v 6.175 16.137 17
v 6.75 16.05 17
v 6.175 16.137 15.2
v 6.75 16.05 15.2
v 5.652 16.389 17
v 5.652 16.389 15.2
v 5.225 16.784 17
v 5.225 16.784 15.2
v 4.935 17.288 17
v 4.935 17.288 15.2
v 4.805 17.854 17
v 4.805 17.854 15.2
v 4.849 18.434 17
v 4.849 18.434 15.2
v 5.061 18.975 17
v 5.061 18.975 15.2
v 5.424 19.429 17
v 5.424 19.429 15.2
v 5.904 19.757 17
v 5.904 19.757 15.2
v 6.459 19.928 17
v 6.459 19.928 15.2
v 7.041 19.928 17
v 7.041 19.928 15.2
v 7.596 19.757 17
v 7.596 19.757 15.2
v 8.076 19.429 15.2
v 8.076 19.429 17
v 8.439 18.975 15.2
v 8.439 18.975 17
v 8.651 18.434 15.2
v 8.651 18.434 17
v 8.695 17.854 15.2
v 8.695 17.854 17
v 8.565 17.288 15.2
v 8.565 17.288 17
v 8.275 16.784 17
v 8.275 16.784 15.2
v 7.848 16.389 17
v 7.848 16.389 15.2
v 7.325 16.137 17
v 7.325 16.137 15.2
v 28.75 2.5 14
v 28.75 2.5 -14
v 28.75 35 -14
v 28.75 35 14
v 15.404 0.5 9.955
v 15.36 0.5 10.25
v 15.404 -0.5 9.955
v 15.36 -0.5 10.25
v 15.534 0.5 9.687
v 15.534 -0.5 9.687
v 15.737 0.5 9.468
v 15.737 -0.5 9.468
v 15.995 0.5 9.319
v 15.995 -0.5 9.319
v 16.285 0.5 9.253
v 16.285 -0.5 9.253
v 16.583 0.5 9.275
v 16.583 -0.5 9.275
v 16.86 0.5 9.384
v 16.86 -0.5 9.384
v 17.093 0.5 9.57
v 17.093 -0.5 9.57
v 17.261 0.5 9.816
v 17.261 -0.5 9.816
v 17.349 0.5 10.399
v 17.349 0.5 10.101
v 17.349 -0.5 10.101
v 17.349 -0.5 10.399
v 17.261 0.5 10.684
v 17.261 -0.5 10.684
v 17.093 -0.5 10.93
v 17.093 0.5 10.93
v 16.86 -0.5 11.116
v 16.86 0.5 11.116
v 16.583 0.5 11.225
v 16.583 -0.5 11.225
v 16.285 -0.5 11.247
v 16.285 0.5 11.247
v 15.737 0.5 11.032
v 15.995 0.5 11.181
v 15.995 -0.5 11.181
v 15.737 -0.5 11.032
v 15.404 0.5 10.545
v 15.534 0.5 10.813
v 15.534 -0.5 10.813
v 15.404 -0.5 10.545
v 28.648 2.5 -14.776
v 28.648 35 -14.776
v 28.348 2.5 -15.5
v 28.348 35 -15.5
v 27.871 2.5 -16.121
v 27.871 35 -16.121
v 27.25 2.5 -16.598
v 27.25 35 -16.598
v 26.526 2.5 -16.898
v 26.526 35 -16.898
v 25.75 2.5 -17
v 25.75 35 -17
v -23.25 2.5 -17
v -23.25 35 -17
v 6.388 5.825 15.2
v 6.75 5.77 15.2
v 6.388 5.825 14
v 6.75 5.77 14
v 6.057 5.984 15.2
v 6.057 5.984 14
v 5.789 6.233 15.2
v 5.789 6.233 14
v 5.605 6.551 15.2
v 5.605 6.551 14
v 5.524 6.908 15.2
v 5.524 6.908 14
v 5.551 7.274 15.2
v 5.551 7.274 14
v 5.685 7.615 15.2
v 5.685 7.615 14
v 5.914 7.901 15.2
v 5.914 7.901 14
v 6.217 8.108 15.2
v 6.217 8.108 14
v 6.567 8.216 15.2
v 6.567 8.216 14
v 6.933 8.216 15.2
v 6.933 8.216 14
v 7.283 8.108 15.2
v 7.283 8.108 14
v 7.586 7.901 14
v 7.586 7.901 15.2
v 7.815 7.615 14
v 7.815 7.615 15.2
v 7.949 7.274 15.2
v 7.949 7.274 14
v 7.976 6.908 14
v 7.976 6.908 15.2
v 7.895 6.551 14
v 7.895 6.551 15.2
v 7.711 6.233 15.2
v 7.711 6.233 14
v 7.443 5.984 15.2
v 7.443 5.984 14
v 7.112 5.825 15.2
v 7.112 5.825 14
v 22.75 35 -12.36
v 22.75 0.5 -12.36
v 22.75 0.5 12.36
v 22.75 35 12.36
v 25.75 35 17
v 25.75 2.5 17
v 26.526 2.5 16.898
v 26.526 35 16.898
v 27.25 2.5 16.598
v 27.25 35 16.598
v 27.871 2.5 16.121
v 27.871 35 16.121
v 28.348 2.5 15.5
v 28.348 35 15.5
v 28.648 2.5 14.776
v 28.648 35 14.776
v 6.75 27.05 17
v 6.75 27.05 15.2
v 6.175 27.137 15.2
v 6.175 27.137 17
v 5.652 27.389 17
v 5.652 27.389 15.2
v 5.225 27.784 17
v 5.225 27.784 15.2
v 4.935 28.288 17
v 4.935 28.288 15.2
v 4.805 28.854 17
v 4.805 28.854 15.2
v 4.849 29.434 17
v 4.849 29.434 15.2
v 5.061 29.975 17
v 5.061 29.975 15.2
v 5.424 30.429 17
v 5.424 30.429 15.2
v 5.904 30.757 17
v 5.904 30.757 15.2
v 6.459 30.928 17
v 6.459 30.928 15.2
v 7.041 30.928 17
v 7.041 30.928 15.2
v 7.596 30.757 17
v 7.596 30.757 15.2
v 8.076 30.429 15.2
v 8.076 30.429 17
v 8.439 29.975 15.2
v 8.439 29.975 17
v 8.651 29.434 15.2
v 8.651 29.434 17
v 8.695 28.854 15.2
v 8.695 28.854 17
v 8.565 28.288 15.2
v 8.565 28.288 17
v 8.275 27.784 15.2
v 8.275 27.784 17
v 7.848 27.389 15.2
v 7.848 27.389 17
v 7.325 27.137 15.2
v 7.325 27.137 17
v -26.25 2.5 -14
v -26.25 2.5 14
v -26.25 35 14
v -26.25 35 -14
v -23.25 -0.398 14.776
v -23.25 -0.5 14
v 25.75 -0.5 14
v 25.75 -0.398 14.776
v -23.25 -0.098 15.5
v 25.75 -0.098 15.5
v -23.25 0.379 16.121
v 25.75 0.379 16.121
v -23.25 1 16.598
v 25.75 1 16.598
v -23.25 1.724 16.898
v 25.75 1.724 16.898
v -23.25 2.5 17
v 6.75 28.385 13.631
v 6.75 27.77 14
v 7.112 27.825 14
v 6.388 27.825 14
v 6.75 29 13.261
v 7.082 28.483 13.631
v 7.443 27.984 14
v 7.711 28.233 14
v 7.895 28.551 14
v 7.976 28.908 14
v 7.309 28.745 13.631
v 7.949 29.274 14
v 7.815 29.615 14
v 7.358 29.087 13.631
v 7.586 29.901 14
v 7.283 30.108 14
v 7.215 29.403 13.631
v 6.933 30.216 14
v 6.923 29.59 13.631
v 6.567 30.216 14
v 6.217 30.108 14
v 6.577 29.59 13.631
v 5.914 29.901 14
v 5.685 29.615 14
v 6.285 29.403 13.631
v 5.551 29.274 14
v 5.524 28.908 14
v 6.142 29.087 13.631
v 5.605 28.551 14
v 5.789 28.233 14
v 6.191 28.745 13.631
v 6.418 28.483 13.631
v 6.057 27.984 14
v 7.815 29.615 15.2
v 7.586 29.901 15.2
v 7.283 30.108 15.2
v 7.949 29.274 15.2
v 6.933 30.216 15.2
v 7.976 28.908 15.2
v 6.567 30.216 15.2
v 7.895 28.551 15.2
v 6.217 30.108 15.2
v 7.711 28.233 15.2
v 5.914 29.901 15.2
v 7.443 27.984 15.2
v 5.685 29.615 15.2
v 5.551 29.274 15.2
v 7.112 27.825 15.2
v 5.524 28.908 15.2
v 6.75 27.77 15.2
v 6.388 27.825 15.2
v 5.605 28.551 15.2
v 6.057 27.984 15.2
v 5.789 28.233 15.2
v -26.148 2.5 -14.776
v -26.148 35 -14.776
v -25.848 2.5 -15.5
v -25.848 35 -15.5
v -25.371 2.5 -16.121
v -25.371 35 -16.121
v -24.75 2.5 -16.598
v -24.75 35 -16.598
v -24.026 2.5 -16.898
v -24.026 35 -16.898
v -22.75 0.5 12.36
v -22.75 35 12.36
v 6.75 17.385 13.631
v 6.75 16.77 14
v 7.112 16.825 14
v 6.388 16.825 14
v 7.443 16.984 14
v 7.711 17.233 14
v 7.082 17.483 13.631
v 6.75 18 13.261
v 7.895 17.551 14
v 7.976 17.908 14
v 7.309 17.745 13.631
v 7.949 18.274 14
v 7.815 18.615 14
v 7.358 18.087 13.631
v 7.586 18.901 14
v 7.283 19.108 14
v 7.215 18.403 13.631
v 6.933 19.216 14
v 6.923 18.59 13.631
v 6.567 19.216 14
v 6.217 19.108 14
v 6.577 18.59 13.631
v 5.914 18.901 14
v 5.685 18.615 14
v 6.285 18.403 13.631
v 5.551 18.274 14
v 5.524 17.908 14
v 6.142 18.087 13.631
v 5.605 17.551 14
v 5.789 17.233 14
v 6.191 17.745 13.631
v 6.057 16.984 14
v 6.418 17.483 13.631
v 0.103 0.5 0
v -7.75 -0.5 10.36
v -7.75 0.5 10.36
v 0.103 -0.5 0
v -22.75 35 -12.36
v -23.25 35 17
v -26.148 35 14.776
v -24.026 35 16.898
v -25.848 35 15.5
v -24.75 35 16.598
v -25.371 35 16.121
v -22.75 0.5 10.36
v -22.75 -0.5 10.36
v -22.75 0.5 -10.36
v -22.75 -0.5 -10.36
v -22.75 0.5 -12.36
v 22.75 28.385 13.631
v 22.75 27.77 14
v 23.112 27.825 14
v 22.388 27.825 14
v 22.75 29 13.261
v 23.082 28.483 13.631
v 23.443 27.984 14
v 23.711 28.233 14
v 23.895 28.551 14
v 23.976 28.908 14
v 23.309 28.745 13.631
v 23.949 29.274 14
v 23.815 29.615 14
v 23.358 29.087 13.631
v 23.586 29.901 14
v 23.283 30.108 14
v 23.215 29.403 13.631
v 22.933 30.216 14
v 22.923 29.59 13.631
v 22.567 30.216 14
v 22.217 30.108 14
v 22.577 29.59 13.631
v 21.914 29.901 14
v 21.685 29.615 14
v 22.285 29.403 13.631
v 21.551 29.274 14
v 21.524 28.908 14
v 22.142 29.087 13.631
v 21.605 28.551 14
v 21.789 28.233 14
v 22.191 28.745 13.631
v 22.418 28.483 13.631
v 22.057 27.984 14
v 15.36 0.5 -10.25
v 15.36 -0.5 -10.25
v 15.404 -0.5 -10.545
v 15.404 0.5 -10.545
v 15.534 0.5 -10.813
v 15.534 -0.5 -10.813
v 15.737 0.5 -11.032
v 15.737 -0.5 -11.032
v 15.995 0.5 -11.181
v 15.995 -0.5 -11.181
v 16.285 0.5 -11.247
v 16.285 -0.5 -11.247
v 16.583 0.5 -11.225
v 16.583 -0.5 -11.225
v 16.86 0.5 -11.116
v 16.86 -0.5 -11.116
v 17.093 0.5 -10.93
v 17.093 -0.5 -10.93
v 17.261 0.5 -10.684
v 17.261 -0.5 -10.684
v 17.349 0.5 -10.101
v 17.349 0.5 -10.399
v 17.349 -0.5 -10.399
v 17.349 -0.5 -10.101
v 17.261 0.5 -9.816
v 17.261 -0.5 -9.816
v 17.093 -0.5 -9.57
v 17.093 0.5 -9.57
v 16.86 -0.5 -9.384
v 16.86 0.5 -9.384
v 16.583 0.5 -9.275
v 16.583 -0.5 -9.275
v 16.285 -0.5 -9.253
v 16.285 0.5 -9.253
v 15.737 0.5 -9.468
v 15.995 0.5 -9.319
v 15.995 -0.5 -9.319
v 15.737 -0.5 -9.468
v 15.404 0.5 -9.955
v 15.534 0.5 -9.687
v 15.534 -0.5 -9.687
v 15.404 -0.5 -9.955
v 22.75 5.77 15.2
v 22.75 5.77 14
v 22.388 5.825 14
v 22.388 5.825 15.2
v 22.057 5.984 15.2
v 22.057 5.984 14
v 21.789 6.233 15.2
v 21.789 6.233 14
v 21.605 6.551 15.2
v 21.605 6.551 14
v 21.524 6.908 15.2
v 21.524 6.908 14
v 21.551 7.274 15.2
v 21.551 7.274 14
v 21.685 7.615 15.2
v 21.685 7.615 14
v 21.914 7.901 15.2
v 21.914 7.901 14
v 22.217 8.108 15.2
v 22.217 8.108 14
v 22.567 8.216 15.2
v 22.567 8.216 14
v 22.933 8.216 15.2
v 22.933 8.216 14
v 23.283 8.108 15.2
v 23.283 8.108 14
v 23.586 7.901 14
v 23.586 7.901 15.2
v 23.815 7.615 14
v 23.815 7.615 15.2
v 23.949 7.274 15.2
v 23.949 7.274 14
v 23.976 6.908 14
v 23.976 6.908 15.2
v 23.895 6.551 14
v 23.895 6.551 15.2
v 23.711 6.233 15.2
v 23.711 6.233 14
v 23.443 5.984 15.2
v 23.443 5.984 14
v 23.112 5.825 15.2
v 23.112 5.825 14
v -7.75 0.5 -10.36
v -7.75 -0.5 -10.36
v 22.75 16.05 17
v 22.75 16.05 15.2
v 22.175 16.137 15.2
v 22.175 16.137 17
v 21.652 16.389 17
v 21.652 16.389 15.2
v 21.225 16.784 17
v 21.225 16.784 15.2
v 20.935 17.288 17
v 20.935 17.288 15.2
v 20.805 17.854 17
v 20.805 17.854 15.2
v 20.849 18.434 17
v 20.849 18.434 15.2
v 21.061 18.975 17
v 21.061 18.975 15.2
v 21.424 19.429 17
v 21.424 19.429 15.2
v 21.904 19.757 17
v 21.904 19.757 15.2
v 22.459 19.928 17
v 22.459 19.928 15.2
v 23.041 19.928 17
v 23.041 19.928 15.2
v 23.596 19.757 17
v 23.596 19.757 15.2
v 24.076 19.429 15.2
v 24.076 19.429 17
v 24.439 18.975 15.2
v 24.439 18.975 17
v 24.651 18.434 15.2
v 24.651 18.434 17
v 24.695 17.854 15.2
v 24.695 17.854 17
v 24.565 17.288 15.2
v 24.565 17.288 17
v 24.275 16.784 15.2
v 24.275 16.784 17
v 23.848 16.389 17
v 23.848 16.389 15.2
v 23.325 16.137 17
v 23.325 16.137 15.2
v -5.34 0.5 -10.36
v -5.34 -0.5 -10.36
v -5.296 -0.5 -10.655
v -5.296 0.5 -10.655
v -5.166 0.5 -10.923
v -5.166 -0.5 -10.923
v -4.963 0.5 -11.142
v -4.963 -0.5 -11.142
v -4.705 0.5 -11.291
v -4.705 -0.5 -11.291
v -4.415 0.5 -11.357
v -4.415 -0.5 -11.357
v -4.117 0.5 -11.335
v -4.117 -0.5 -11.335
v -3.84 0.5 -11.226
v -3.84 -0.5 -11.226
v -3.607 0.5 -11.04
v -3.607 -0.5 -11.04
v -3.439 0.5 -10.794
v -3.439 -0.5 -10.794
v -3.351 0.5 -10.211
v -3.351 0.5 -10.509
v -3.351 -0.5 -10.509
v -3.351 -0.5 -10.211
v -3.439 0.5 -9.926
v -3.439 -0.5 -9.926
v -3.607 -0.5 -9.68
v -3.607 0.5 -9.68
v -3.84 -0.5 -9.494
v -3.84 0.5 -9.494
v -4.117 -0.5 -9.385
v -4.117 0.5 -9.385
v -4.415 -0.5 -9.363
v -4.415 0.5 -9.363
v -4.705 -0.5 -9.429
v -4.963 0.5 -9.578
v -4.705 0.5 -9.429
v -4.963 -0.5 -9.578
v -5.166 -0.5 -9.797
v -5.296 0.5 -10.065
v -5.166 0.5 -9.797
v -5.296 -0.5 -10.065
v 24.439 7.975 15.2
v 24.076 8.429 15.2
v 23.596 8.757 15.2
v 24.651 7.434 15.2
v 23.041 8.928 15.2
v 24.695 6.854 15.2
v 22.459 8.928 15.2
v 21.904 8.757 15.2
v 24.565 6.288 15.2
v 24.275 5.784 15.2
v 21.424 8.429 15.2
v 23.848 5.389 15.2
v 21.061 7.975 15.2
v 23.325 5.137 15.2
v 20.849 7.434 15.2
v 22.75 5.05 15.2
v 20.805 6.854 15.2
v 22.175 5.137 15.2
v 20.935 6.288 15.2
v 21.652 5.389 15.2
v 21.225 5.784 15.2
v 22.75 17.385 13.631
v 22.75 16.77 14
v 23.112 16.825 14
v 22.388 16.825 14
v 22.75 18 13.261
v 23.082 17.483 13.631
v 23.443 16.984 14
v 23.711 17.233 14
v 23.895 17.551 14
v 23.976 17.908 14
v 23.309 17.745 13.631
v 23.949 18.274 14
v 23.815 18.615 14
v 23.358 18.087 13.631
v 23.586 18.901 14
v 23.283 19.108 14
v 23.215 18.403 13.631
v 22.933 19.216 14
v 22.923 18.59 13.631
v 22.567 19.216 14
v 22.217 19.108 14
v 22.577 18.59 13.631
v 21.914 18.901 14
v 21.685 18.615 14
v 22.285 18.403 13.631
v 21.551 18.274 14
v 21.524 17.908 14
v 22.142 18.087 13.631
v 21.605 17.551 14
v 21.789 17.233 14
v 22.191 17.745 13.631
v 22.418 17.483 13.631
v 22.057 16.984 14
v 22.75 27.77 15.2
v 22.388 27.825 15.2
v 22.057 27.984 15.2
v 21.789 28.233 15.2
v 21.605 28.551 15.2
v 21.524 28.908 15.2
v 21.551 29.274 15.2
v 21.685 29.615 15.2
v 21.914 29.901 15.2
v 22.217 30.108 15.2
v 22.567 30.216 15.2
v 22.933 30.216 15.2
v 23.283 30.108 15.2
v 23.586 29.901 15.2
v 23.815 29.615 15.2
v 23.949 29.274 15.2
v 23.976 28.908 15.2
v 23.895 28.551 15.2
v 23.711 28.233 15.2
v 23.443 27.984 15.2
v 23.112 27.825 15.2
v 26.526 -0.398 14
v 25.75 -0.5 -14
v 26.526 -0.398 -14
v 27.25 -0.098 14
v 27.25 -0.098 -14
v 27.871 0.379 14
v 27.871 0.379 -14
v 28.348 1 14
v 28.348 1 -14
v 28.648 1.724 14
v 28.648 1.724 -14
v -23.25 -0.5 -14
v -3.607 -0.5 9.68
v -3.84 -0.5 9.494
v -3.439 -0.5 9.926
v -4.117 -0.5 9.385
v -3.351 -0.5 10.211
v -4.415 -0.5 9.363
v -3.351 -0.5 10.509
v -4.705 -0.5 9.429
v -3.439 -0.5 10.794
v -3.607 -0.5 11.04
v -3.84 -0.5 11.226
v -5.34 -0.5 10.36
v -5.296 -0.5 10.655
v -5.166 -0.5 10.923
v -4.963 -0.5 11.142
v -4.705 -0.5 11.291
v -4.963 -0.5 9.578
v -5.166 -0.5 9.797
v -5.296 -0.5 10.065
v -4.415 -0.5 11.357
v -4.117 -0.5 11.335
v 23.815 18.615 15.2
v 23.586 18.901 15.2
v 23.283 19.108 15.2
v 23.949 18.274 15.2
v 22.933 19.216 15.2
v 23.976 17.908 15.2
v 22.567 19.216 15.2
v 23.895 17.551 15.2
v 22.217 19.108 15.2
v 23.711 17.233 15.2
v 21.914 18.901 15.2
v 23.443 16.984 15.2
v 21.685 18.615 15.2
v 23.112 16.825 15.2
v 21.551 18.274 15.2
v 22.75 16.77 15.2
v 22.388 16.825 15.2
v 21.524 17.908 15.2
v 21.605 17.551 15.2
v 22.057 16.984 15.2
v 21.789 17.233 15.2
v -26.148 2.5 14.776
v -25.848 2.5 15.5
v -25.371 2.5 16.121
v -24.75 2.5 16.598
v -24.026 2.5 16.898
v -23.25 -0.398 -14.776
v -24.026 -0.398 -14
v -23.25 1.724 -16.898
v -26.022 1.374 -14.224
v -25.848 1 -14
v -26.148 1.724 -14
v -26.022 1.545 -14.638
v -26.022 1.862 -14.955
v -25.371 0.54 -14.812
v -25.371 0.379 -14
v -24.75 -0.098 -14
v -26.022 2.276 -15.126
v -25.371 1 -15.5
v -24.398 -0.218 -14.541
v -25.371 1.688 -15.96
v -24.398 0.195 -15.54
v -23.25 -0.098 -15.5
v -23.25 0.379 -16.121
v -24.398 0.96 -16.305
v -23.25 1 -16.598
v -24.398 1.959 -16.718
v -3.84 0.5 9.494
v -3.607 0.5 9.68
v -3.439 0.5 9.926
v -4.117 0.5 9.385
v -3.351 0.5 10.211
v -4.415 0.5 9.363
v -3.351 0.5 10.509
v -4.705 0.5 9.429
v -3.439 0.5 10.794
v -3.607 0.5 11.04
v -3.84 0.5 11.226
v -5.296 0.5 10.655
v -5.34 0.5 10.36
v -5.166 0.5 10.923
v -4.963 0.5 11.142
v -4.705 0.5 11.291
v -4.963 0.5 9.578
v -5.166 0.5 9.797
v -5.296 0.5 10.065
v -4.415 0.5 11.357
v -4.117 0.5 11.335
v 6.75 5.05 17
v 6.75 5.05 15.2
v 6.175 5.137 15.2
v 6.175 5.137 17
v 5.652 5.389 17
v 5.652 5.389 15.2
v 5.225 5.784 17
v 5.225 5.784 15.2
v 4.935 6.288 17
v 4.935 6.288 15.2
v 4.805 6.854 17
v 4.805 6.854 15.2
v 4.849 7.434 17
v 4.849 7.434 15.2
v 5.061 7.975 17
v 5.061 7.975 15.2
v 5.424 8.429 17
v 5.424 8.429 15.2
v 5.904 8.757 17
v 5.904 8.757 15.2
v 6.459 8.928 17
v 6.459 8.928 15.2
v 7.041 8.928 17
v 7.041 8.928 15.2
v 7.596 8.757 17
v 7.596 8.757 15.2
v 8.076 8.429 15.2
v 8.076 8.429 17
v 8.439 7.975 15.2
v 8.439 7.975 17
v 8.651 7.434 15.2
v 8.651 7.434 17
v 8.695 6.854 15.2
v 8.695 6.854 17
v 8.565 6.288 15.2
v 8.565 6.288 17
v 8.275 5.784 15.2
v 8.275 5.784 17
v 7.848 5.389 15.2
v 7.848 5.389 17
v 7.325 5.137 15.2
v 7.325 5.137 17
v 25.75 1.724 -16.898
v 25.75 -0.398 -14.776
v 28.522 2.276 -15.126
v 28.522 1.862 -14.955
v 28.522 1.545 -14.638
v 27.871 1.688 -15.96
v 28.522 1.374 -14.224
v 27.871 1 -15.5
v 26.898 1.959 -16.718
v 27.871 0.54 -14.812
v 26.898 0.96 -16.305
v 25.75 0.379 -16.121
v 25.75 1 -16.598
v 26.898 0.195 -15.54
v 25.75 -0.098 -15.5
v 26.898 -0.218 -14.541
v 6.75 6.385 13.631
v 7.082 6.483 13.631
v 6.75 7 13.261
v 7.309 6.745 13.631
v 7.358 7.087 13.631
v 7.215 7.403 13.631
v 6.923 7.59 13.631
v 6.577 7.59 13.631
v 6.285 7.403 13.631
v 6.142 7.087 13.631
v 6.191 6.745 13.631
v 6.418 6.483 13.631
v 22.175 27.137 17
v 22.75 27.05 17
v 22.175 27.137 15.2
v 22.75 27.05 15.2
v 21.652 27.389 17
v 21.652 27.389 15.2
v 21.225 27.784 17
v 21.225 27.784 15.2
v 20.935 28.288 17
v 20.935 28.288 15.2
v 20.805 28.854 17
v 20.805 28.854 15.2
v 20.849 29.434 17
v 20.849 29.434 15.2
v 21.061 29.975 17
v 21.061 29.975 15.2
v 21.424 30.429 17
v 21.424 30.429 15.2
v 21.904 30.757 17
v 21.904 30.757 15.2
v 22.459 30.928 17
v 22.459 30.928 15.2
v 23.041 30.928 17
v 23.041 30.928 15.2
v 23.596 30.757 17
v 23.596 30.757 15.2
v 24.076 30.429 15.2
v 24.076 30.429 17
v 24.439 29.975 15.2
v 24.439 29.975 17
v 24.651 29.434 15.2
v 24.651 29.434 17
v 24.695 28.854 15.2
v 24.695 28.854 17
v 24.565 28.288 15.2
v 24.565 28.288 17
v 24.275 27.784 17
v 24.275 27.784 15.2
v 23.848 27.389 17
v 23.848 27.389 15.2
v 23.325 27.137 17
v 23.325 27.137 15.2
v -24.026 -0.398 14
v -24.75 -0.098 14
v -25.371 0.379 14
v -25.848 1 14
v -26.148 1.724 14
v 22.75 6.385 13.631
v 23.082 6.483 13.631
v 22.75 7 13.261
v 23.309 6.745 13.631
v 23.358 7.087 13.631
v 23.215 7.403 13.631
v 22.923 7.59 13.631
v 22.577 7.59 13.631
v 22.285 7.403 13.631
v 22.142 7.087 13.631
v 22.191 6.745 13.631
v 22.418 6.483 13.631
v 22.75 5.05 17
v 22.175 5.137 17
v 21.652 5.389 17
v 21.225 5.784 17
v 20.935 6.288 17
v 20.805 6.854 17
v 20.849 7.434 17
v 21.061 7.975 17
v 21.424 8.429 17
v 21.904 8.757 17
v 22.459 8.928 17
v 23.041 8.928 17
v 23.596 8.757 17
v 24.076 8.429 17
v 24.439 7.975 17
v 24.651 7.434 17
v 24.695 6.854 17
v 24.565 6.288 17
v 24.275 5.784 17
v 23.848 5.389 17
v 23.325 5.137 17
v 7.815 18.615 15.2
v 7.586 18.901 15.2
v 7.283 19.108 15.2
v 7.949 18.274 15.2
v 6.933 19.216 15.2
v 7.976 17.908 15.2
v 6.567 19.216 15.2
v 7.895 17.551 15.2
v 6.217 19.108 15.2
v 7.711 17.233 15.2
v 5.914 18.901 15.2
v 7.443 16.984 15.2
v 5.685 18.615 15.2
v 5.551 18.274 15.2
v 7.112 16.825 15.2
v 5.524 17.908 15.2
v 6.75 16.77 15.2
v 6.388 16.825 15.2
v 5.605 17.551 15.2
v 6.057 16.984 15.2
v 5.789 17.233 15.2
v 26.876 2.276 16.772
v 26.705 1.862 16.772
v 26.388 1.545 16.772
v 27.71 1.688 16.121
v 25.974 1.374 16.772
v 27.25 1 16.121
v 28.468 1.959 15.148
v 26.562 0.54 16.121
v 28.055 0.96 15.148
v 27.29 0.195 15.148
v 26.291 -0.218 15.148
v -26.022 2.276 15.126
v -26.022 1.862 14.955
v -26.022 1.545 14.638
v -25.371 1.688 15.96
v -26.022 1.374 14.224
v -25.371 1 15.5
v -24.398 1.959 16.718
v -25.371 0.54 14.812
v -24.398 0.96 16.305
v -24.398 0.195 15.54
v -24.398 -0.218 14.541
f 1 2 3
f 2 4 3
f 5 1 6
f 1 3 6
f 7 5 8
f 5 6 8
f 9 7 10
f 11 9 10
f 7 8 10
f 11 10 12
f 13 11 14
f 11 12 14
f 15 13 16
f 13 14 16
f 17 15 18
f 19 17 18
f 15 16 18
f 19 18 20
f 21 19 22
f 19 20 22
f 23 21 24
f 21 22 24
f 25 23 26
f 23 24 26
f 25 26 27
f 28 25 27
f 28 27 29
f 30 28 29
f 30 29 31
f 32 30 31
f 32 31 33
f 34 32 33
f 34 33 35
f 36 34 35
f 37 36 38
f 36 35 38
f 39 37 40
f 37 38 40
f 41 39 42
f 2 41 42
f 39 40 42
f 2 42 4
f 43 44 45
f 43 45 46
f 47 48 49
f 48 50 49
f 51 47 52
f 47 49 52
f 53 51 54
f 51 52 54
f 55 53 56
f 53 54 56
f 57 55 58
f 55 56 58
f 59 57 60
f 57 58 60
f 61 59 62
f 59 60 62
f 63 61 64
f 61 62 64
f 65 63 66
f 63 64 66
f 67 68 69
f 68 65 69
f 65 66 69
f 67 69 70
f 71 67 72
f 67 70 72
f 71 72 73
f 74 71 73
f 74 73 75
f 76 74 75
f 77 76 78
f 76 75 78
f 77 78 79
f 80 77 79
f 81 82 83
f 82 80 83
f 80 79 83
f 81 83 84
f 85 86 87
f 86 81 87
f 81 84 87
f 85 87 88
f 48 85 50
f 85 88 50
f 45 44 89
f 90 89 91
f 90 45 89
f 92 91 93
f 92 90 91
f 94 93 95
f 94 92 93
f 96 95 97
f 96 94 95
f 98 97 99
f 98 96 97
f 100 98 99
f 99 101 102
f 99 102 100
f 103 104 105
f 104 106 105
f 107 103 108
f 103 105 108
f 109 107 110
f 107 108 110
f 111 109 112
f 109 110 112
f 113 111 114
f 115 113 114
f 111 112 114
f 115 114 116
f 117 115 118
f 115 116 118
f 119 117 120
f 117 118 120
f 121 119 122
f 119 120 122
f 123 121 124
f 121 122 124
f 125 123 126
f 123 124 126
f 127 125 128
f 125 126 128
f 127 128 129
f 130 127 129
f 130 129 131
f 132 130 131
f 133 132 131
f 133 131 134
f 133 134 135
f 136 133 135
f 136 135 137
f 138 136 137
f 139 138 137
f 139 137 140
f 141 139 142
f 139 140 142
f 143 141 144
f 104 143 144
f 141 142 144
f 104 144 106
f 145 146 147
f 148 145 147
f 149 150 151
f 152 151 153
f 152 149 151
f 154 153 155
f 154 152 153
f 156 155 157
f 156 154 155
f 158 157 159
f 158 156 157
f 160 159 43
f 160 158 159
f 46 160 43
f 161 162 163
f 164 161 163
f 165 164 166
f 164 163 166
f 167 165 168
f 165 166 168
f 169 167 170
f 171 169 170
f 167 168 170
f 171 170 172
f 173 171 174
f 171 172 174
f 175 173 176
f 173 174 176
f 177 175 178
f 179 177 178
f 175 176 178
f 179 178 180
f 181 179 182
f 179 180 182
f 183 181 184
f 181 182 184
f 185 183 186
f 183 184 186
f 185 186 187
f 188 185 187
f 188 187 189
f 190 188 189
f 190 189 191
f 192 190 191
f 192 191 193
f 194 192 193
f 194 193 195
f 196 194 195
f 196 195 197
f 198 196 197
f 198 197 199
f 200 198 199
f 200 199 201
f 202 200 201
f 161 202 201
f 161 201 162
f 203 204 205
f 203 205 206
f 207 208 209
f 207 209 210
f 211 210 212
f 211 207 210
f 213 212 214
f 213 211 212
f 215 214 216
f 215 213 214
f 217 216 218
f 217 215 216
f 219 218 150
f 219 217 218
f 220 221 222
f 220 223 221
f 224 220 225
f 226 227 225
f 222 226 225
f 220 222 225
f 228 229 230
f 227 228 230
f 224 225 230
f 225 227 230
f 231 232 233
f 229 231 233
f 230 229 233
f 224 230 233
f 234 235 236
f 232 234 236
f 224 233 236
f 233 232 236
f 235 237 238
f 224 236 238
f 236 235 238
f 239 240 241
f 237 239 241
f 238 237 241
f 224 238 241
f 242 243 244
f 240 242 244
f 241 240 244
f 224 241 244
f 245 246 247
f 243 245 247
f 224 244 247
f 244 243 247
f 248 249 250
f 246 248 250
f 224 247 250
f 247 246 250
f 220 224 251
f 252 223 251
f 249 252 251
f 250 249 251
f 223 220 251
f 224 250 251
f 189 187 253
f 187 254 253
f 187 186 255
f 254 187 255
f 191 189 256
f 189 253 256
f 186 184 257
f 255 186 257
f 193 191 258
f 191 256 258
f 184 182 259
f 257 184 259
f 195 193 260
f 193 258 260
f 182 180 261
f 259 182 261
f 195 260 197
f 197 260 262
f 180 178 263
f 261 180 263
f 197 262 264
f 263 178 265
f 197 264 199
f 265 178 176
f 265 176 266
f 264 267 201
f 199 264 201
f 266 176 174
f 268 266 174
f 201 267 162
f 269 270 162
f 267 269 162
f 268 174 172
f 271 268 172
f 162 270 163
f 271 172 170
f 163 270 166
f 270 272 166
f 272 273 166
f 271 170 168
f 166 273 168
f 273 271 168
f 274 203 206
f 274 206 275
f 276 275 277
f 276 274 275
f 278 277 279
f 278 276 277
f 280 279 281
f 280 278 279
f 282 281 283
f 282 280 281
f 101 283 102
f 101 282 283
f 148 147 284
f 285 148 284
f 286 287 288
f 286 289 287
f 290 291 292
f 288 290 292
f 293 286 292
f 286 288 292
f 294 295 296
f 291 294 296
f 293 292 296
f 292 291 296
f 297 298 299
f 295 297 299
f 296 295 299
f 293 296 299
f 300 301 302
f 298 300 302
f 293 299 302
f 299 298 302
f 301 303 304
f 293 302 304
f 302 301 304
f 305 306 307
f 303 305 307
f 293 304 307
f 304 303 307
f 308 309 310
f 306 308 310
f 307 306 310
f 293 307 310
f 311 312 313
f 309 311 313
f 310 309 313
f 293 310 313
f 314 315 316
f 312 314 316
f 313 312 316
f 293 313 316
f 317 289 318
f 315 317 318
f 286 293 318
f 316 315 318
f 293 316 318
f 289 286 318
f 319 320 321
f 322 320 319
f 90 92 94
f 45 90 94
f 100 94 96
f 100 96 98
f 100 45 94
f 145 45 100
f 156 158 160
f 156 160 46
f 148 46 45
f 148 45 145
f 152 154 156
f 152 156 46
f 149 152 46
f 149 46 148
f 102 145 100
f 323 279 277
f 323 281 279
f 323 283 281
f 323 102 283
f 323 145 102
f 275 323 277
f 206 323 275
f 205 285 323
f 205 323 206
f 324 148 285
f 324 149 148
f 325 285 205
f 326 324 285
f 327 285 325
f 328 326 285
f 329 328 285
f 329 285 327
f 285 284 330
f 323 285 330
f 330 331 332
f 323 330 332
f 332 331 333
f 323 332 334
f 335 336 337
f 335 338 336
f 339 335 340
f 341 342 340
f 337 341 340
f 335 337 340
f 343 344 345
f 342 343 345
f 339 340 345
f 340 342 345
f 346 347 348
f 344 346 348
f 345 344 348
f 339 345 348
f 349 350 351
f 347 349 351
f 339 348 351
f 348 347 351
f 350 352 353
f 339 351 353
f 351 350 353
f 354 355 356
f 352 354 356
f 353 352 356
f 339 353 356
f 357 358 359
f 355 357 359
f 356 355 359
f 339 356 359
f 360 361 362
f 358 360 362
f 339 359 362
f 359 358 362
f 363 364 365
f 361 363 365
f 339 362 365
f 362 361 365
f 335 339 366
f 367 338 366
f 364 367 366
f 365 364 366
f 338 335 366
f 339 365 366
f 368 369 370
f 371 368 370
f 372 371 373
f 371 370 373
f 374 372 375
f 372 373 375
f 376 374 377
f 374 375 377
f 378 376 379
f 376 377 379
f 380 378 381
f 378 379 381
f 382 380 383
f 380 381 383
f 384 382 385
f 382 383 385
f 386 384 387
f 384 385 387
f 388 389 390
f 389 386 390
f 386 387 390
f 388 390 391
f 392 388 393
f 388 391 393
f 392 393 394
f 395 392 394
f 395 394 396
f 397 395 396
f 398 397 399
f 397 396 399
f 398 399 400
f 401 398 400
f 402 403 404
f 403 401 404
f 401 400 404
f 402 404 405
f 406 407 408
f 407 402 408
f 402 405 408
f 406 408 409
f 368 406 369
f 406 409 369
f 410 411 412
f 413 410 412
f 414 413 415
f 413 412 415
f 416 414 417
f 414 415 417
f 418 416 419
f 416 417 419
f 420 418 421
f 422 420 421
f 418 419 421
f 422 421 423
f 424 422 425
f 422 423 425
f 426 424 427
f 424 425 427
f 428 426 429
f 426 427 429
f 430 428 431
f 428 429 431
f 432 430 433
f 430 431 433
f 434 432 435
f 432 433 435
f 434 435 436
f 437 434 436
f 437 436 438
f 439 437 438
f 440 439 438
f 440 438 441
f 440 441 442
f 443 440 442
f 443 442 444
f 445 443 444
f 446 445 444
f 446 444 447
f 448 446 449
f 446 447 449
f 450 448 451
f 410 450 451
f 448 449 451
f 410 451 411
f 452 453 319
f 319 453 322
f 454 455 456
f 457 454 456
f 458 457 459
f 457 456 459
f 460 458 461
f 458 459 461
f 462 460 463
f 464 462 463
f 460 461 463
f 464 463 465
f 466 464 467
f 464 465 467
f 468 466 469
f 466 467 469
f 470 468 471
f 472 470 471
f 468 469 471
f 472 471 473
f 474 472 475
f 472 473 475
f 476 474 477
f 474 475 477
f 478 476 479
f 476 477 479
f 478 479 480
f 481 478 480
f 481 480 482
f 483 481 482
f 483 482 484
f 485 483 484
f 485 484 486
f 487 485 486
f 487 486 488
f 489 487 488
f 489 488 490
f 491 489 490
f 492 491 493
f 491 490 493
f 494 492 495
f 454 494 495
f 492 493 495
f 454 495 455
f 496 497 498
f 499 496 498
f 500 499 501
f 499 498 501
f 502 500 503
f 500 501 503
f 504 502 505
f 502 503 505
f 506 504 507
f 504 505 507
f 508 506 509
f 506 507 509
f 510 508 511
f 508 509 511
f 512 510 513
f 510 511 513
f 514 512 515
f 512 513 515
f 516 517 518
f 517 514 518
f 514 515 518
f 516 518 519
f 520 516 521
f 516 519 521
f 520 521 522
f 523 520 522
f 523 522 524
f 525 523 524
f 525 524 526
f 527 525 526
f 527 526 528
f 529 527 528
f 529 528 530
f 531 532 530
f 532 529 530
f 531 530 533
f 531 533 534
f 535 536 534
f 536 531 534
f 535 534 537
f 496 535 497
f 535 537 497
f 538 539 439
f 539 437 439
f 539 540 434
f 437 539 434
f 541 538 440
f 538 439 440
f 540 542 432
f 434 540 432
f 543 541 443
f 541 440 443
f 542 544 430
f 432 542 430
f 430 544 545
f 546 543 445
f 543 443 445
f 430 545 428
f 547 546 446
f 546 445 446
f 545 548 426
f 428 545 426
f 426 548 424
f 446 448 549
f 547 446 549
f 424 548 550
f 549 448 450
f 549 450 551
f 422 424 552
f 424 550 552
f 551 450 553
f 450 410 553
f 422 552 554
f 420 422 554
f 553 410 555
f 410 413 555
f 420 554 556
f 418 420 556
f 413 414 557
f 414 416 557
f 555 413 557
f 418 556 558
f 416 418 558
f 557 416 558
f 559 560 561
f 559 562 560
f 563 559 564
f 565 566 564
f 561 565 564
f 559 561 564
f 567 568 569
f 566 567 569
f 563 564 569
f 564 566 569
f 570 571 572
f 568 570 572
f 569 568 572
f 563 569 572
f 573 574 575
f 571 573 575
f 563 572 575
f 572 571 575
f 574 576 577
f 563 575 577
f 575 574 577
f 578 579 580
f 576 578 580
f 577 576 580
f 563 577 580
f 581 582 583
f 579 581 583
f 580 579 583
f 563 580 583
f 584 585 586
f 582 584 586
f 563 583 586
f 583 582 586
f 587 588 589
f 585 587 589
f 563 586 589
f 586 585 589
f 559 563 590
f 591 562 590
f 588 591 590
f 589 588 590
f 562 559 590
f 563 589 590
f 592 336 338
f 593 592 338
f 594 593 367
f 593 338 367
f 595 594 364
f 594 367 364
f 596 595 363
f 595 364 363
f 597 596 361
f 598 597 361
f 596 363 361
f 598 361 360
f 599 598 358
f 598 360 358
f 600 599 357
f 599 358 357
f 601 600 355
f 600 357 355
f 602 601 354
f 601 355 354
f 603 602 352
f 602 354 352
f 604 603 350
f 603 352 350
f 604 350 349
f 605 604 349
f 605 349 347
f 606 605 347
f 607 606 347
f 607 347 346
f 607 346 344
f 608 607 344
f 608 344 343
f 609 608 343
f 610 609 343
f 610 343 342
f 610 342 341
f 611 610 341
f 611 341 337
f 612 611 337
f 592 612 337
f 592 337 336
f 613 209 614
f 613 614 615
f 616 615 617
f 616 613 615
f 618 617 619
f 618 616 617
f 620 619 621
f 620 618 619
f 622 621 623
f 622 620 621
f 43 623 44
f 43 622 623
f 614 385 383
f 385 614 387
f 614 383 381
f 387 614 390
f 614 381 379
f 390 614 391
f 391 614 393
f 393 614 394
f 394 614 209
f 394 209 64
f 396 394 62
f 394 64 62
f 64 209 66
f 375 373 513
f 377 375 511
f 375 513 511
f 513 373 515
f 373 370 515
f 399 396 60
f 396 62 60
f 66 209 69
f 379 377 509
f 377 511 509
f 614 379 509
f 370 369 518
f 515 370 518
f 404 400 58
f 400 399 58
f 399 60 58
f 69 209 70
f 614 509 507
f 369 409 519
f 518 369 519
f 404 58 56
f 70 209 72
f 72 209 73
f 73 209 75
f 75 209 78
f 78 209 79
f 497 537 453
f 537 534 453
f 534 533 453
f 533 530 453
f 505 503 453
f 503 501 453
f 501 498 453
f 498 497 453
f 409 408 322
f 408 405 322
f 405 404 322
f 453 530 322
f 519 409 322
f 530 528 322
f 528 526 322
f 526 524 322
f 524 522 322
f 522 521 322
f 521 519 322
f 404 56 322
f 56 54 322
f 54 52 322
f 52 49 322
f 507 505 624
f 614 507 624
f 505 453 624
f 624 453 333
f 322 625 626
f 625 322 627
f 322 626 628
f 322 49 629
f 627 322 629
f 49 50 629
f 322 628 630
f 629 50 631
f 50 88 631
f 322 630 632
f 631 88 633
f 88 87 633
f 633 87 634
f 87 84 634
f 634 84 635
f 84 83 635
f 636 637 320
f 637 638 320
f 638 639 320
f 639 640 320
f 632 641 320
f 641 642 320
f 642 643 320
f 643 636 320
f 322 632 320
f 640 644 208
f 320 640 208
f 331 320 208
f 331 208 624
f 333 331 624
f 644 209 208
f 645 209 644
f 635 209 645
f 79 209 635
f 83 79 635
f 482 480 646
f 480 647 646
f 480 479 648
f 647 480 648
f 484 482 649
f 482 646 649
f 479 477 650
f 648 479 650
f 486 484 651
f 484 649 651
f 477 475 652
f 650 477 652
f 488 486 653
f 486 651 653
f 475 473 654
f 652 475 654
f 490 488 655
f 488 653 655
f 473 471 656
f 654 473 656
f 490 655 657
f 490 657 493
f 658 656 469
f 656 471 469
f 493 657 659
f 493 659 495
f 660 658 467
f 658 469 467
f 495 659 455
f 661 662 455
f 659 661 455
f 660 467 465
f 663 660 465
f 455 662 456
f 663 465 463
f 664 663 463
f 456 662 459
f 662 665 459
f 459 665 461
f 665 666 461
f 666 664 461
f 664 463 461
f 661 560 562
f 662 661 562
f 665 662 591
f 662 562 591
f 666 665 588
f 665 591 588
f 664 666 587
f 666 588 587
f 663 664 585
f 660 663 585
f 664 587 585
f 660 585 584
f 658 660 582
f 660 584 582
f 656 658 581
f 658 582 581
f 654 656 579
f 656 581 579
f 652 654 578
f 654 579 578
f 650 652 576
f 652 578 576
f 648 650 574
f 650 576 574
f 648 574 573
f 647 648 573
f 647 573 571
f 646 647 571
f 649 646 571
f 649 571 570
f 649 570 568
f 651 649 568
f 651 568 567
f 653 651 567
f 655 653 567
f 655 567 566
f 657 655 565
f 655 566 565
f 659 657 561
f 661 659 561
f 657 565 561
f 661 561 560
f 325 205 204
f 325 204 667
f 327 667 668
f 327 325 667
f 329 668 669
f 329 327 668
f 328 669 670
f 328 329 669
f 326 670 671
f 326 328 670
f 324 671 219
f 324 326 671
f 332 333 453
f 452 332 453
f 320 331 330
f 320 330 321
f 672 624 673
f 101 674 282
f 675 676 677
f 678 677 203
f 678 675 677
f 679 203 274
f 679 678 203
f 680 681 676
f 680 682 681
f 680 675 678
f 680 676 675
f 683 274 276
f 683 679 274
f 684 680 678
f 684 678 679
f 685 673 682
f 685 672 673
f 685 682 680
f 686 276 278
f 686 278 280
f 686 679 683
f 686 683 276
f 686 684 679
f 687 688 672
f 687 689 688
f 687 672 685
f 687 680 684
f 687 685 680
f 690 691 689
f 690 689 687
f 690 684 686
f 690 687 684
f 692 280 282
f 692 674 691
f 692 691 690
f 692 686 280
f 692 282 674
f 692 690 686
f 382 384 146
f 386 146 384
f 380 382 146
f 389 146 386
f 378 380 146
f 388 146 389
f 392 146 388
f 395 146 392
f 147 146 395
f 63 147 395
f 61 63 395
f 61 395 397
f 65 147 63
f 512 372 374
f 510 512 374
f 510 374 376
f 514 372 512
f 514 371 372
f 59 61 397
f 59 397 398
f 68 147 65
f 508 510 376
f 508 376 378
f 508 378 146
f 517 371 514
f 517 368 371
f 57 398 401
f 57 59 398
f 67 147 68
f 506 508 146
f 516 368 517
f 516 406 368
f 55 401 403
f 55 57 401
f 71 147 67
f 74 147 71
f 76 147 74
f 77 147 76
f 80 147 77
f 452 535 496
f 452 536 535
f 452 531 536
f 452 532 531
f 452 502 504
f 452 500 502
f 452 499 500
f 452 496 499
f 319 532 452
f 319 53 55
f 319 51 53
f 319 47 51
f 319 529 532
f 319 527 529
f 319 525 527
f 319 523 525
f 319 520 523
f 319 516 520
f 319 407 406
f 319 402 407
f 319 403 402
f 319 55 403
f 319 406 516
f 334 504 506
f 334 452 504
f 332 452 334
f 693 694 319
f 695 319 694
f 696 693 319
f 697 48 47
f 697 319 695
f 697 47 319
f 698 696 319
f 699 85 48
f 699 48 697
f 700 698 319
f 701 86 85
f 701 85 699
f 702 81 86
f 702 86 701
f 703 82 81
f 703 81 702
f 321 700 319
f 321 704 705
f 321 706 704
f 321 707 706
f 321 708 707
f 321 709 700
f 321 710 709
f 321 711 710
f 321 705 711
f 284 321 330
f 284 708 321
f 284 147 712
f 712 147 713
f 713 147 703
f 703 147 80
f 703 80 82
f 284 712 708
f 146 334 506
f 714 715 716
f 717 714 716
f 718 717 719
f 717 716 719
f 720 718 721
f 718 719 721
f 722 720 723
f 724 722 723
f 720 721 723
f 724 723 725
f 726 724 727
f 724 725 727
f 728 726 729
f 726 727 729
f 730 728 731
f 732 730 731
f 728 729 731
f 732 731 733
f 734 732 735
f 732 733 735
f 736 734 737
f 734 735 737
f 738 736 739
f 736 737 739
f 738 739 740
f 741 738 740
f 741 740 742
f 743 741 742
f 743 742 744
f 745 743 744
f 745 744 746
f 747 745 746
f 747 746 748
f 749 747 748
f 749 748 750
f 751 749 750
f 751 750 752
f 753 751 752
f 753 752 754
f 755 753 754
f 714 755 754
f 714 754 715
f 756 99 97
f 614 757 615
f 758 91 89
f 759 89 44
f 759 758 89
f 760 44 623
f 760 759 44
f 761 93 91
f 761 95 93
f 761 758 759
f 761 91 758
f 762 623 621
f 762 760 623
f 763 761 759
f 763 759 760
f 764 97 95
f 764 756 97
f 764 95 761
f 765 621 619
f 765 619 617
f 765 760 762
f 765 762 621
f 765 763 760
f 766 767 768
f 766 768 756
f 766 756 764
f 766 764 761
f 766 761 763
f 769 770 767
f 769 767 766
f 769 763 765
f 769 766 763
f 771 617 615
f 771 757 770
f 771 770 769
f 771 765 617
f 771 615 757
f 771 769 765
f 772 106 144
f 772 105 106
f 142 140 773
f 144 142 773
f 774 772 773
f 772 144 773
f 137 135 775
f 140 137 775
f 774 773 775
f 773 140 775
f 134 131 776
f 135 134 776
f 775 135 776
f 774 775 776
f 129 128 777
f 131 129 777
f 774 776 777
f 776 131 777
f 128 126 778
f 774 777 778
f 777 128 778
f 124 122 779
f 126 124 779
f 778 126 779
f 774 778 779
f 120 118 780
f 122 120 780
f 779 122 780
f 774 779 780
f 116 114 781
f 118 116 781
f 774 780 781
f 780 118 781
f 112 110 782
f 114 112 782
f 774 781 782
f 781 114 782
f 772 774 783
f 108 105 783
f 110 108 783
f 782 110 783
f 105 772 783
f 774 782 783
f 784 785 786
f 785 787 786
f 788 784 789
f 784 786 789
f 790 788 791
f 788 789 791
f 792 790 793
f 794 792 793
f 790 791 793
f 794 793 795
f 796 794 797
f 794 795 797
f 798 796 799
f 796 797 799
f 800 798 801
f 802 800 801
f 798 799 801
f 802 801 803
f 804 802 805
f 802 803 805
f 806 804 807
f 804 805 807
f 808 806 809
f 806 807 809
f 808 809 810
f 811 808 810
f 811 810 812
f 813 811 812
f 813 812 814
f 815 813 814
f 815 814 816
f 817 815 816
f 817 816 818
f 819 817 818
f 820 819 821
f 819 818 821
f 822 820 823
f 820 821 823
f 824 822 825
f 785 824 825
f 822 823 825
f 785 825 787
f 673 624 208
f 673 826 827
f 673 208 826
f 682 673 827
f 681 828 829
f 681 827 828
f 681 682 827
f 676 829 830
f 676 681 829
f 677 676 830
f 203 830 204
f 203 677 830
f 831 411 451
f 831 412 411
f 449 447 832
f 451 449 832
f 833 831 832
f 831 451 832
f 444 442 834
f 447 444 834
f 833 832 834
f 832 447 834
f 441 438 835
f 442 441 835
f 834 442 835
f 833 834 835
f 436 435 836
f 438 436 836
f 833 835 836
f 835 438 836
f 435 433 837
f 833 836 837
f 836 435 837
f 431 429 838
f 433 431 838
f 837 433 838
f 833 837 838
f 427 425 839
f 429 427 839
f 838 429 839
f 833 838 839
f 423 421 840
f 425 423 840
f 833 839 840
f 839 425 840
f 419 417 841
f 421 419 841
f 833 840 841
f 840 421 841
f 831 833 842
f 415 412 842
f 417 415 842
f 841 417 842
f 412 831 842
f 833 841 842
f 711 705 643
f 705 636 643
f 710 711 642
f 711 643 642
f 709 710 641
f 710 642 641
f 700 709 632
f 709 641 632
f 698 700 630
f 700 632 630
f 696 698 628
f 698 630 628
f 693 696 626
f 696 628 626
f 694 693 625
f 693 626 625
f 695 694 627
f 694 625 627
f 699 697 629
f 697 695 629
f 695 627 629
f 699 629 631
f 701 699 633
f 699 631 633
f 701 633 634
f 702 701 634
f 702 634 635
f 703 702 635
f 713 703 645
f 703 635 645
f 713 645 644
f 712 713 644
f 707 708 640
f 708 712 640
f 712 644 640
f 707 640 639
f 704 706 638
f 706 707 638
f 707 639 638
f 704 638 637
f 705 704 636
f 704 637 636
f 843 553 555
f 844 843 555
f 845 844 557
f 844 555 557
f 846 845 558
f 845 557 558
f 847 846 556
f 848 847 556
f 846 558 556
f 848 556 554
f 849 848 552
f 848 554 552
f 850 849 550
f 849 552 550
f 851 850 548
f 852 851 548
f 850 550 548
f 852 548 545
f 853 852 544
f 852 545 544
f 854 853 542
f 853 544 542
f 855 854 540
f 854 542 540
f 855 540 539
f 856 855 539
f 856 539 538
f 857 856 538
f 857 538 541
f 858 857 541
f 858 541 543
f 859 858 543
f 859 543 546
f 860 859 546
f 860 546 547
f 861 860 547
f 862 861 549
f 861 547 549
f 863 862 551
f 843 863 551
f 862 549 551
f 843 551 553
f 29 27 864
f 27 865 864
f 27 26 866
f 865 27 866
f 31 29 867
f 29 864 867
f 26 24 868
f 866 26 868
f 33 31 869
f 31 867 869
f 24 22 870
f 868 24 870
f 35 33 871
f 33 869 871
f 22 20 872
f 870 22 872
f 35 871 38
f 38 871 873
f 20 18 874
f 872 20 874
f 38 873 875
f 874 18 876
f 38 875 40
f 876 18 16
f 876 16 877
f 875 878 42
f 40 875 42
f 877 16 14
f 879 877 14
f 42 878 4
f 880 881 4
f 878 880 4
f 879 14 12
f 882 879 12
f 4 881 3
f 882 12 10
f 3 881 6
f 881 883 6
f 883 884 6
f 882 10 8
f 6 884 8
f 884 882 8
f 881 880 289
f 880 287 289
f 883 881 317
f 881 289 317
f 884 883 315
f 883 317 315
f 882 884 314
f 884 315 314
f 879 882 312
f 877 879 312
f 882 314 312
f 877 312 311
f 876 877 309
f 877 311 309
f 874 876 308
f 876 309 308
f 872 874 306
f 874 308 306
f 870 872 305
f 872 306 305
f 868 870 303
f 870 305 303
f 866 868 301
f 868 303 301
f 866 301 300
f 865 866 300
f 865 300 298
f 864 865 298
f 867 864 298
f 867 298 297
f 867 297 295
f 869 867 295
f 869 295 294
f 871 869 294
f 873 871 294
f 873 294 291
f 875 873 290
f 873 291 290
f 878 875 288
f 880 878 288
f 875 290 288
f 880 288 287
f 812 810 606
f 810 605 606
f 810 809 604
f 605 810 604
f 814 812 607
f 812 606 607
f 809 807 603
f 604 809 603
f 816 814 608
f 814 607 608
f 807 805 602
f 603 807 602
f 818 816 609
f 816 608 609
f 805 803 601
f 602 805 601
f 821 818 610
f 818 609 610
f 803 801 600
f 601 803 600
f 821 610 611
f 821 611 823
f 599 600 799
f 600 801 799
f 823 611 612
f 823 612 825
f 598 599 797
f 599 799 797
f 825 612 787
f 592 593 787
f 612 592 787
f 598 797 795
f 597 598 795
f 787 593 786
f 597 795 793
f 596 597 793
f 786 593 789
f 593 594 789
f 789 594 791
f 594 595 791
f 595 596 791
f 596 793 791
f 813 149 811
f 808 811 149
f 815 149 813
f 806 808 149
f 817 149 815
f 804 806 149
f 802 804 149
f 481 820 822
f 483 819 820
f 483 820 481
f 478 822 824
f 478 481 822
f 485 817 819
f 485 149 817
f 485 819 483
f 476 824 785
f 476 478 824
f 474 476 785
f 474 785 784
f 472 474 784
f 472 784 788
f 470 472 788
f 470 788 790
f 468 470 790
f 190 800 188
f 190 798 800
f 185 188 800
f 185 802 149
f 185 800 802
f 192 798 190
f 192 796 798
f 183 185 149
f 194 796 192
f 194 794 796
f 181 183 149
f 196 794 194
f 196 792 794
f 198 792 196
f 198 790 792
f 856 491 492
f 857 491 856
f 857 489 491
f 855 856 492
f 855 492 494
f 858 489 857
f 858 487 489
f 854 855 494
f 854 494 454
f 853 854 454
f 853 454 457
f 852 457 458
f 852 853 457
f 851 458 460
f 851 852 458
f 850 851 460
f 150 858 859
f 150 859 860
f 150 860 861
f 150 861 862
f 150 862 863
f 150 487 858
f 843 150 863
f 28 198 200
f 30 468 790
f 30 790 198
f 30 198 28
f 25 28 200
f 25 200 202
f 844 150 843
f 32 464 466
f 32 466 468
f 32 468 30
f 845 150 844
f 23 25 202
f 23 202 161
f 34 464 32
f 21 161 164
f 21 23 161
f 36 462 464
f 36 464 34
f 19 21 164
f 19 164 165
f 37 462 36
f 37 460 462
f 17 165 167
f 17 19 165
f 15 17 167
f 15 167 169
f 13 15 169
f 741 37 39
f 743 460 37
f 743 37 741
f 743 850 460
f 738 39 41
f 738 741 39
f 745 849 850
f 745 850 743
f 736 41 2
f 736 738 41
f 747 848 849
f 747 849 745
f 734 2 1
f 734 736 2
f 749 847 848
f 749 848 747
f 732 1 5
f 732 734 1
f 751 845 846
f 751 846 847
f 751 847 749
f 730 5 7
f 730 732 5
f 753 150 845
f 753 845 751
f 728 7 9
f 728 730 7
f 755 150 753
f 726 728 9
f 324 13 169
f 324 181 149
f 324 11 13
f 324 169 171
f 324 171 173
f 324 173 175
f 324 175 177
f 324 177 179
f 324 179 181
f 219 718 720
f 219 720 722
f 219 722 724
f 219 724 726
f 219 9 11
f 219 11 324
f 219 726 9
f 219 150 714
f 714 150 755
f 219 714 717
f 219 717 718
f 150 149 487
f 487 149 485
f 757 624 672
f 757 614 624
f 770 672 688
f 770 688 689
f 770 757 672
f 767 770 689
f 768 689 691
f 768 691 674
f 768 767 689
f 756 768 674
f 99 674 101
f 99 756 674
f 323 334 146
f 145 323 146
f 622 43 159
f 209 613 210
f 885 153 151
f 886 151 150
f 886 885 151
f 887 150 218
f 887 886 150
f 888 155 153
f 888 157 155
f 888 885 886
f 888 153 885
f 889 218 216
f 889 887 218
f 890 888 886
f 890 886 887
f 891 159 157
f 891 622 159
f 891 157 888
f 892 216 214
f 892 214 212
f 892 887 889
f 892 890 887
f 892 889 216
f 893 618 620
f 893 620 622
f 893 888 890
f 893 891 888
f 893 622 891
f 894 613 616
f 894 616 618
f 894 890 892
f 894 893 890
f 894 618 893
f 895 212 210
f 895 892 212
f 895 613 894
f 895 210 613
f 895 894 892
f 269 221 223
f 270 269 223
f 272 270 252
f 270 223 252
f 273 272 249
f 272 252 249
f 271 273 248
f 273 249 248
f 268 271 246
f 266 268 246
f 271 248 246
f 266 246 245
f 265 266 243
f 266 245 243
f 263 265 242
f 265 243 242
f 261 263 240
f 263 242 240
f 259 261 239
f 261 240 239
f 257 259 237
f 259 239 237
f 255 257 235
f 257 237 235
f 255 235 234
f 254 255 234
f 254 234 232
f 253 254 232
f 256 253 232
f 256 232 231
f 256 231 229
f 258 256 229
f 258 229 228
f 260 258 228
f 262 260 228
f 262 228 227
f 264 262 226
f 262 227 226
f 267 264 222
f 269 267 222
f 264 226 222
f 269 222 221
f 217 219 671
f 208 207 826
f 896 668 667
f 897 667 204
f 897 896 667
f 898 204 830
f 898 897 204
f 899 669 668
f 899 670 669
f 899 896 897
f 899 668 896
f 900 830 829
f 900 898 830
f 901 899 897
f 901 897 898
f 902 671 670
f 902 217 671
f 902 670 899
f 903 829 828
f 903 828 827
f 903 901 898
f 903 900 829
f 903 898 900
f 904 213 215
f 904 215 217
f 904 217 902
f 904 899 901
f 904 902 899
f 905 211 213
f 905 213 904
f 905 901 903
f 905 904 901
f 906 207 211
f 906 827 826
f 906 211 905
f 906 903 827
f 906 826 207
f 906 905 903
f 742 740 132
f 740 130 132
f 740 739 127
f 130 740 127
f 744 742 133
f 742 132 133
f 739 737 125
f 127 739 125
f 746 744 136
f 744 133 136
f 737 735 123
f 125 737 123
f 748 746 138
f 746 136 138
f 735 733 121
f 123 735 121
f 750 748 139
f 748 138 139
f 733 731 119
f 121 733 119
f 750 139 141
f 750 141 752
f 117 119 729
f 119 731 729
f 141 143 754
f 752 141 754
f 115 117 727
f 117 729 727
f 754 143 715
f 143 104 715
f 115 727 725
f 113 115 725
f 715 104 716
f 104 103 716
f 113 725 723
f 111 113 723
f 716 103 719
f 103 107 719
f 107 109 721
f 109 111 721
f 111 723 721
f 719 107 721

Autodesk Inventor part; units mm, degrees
ref_plane "YZ Plane" through (0, 0, 0) normal (1, 0, 0) x (0, 1, 0)
ref_plane "XZ Plane" through (0, 0, 0) normal (0, 1, 0) x (-1, 0, 0)
ref_plane "XY Plane" through (0, 0, 0) normal (0, 0, 1) x (1, 0, 0)
sketch "Sketch1" plane through (0, 0, 0) normal (0, 1, 0) x (-1, 0, 0)
  line L0 (22.75, -10.36) -> (7.75, -10.36)
  line L1 (7.75, -10.36) -> (-0.1031, 0)
  circle A0 centre (4.34, -10.36) radius 1
  line L2 (22.75, 10.36) -> (7.75, 10.36)
  circle A1 centre (12.64, 0) radius 9.6 construction
  line L3 (22.75, 12.36) -> (22.75, -12.36)
  circle A2 centre (4.34, 10.36) radius 1
  line L4 (7.75, 10.36) -> (-0.1031, 0)
  line L5 (26.25, 17) -> (26.25, -17)
  line L6 (22.75, -12.36) -> (-22.75, -12.36)
  line L7 (22.75, 0) -> (-22.75, 0) construction
  line L8 (26.25, -17) -> (-28.75, -17)
  line L9 (26.25, -17) -> (-28.75, 17) construction
  line L10 (-28.75, -17) -> (26.25, 17) construction
  line L11 (-22.75, 12.36) -> (22.75, 12.36)
  line L12 (-28.75, 17) -> (26.25, 17)
  line L13 (-28.75, -17) -> (-28.75, 17)
  circle A3 centre (-16.36, 10.25) radius 1
  line L14 (-22.75, -12.36) -> (-22.75, 12.36)
  circle A4 centre (-16.36, -10.25) radius 1
  point P0 (0, 0)
  point P1 (-1.25, 0)
  point P2 (0, 0)
  point P3 (22.75, -10.36)
  dimension "d0" = 55
  dimension "d1" = 34
  dimension "d2" = 45.5
  dimension "d3" = 24.72
  dimension "d4" = 2
  dimension "d6" = 18.41
  dimension "d7" = 20.5
  dimension "d8" = 19.2
  dimension "d9" = 10.11
  dimension "d10" = 13
  dimension "d11" = 15
  dimension "d12" = 3.5
  dimension "d13" = 2
  dimension "d14" = 3.41
  dimension "d51" = 20.7
extrude "Extrusion1" add sketch "Sketch1" along normal mid plane 1 contours L3 L6 L14 L11 L2 L4 L1 L0 | L5 L8 L13 L12
extrude "Extrusion2" add sketch "Sketch1" along normal blind 35 contours L5 L8 L13 L12
fillet "Fillet1" radius 3 8 edges at (1.25, -0.5, -17) (28.75, -0.5, 0) (1.25, -0.5, 17) (-26.25, -0.5, 0) (28.75, 17.25, -17) (28.75, 17.25, 17) (-26.25, 17.25, 17) (-26.25, 17.25, -17)
sketch "Sketch3" plane through (-23.25, 35, 17) normal (0, 0, 1) x (1, 0, 0)
  line L0 (46, -34.5) -> (46, 0) projected
  circle A0 centre (46, -28) radius 1.5
  line L1 (49, -32.5) -> (0, -32.5) projected
  circle A1 centre (46, -17) radius 1.5
  circle A2 centre (46, -6) radius 1.5
  circle A3 centre (30, -28) radius 1.5
  circle A4 centre (30, -17) radius 1.5
  circle A5 centre (30, -6) radius 1.5
  line L2 (52, -32.5) -> (52, 0) projected
  point P0 (23.25, -35)
  dimension "d20" = 3
  dimension "d23" = 11
  dimension "d26" = 16
  dimension "d29" = 4.5
  dimension "d37" = 6
hole "Hole1" at (22.75, 7, 17) at (6.75, 7, 17) at (6.75, 18, 17) at (22.75, 18, 17) at (22.75, 29, 17) at (6.75, 29, 17) direction (0, 0, -1) diameter 2.459 depth 3 tip angle 118 counterbore diameter 3.9 counterbore depth 1.8 thread size "M3x0.5" class "6H" standard "ISO Metric profile"
properties part number "basket"
